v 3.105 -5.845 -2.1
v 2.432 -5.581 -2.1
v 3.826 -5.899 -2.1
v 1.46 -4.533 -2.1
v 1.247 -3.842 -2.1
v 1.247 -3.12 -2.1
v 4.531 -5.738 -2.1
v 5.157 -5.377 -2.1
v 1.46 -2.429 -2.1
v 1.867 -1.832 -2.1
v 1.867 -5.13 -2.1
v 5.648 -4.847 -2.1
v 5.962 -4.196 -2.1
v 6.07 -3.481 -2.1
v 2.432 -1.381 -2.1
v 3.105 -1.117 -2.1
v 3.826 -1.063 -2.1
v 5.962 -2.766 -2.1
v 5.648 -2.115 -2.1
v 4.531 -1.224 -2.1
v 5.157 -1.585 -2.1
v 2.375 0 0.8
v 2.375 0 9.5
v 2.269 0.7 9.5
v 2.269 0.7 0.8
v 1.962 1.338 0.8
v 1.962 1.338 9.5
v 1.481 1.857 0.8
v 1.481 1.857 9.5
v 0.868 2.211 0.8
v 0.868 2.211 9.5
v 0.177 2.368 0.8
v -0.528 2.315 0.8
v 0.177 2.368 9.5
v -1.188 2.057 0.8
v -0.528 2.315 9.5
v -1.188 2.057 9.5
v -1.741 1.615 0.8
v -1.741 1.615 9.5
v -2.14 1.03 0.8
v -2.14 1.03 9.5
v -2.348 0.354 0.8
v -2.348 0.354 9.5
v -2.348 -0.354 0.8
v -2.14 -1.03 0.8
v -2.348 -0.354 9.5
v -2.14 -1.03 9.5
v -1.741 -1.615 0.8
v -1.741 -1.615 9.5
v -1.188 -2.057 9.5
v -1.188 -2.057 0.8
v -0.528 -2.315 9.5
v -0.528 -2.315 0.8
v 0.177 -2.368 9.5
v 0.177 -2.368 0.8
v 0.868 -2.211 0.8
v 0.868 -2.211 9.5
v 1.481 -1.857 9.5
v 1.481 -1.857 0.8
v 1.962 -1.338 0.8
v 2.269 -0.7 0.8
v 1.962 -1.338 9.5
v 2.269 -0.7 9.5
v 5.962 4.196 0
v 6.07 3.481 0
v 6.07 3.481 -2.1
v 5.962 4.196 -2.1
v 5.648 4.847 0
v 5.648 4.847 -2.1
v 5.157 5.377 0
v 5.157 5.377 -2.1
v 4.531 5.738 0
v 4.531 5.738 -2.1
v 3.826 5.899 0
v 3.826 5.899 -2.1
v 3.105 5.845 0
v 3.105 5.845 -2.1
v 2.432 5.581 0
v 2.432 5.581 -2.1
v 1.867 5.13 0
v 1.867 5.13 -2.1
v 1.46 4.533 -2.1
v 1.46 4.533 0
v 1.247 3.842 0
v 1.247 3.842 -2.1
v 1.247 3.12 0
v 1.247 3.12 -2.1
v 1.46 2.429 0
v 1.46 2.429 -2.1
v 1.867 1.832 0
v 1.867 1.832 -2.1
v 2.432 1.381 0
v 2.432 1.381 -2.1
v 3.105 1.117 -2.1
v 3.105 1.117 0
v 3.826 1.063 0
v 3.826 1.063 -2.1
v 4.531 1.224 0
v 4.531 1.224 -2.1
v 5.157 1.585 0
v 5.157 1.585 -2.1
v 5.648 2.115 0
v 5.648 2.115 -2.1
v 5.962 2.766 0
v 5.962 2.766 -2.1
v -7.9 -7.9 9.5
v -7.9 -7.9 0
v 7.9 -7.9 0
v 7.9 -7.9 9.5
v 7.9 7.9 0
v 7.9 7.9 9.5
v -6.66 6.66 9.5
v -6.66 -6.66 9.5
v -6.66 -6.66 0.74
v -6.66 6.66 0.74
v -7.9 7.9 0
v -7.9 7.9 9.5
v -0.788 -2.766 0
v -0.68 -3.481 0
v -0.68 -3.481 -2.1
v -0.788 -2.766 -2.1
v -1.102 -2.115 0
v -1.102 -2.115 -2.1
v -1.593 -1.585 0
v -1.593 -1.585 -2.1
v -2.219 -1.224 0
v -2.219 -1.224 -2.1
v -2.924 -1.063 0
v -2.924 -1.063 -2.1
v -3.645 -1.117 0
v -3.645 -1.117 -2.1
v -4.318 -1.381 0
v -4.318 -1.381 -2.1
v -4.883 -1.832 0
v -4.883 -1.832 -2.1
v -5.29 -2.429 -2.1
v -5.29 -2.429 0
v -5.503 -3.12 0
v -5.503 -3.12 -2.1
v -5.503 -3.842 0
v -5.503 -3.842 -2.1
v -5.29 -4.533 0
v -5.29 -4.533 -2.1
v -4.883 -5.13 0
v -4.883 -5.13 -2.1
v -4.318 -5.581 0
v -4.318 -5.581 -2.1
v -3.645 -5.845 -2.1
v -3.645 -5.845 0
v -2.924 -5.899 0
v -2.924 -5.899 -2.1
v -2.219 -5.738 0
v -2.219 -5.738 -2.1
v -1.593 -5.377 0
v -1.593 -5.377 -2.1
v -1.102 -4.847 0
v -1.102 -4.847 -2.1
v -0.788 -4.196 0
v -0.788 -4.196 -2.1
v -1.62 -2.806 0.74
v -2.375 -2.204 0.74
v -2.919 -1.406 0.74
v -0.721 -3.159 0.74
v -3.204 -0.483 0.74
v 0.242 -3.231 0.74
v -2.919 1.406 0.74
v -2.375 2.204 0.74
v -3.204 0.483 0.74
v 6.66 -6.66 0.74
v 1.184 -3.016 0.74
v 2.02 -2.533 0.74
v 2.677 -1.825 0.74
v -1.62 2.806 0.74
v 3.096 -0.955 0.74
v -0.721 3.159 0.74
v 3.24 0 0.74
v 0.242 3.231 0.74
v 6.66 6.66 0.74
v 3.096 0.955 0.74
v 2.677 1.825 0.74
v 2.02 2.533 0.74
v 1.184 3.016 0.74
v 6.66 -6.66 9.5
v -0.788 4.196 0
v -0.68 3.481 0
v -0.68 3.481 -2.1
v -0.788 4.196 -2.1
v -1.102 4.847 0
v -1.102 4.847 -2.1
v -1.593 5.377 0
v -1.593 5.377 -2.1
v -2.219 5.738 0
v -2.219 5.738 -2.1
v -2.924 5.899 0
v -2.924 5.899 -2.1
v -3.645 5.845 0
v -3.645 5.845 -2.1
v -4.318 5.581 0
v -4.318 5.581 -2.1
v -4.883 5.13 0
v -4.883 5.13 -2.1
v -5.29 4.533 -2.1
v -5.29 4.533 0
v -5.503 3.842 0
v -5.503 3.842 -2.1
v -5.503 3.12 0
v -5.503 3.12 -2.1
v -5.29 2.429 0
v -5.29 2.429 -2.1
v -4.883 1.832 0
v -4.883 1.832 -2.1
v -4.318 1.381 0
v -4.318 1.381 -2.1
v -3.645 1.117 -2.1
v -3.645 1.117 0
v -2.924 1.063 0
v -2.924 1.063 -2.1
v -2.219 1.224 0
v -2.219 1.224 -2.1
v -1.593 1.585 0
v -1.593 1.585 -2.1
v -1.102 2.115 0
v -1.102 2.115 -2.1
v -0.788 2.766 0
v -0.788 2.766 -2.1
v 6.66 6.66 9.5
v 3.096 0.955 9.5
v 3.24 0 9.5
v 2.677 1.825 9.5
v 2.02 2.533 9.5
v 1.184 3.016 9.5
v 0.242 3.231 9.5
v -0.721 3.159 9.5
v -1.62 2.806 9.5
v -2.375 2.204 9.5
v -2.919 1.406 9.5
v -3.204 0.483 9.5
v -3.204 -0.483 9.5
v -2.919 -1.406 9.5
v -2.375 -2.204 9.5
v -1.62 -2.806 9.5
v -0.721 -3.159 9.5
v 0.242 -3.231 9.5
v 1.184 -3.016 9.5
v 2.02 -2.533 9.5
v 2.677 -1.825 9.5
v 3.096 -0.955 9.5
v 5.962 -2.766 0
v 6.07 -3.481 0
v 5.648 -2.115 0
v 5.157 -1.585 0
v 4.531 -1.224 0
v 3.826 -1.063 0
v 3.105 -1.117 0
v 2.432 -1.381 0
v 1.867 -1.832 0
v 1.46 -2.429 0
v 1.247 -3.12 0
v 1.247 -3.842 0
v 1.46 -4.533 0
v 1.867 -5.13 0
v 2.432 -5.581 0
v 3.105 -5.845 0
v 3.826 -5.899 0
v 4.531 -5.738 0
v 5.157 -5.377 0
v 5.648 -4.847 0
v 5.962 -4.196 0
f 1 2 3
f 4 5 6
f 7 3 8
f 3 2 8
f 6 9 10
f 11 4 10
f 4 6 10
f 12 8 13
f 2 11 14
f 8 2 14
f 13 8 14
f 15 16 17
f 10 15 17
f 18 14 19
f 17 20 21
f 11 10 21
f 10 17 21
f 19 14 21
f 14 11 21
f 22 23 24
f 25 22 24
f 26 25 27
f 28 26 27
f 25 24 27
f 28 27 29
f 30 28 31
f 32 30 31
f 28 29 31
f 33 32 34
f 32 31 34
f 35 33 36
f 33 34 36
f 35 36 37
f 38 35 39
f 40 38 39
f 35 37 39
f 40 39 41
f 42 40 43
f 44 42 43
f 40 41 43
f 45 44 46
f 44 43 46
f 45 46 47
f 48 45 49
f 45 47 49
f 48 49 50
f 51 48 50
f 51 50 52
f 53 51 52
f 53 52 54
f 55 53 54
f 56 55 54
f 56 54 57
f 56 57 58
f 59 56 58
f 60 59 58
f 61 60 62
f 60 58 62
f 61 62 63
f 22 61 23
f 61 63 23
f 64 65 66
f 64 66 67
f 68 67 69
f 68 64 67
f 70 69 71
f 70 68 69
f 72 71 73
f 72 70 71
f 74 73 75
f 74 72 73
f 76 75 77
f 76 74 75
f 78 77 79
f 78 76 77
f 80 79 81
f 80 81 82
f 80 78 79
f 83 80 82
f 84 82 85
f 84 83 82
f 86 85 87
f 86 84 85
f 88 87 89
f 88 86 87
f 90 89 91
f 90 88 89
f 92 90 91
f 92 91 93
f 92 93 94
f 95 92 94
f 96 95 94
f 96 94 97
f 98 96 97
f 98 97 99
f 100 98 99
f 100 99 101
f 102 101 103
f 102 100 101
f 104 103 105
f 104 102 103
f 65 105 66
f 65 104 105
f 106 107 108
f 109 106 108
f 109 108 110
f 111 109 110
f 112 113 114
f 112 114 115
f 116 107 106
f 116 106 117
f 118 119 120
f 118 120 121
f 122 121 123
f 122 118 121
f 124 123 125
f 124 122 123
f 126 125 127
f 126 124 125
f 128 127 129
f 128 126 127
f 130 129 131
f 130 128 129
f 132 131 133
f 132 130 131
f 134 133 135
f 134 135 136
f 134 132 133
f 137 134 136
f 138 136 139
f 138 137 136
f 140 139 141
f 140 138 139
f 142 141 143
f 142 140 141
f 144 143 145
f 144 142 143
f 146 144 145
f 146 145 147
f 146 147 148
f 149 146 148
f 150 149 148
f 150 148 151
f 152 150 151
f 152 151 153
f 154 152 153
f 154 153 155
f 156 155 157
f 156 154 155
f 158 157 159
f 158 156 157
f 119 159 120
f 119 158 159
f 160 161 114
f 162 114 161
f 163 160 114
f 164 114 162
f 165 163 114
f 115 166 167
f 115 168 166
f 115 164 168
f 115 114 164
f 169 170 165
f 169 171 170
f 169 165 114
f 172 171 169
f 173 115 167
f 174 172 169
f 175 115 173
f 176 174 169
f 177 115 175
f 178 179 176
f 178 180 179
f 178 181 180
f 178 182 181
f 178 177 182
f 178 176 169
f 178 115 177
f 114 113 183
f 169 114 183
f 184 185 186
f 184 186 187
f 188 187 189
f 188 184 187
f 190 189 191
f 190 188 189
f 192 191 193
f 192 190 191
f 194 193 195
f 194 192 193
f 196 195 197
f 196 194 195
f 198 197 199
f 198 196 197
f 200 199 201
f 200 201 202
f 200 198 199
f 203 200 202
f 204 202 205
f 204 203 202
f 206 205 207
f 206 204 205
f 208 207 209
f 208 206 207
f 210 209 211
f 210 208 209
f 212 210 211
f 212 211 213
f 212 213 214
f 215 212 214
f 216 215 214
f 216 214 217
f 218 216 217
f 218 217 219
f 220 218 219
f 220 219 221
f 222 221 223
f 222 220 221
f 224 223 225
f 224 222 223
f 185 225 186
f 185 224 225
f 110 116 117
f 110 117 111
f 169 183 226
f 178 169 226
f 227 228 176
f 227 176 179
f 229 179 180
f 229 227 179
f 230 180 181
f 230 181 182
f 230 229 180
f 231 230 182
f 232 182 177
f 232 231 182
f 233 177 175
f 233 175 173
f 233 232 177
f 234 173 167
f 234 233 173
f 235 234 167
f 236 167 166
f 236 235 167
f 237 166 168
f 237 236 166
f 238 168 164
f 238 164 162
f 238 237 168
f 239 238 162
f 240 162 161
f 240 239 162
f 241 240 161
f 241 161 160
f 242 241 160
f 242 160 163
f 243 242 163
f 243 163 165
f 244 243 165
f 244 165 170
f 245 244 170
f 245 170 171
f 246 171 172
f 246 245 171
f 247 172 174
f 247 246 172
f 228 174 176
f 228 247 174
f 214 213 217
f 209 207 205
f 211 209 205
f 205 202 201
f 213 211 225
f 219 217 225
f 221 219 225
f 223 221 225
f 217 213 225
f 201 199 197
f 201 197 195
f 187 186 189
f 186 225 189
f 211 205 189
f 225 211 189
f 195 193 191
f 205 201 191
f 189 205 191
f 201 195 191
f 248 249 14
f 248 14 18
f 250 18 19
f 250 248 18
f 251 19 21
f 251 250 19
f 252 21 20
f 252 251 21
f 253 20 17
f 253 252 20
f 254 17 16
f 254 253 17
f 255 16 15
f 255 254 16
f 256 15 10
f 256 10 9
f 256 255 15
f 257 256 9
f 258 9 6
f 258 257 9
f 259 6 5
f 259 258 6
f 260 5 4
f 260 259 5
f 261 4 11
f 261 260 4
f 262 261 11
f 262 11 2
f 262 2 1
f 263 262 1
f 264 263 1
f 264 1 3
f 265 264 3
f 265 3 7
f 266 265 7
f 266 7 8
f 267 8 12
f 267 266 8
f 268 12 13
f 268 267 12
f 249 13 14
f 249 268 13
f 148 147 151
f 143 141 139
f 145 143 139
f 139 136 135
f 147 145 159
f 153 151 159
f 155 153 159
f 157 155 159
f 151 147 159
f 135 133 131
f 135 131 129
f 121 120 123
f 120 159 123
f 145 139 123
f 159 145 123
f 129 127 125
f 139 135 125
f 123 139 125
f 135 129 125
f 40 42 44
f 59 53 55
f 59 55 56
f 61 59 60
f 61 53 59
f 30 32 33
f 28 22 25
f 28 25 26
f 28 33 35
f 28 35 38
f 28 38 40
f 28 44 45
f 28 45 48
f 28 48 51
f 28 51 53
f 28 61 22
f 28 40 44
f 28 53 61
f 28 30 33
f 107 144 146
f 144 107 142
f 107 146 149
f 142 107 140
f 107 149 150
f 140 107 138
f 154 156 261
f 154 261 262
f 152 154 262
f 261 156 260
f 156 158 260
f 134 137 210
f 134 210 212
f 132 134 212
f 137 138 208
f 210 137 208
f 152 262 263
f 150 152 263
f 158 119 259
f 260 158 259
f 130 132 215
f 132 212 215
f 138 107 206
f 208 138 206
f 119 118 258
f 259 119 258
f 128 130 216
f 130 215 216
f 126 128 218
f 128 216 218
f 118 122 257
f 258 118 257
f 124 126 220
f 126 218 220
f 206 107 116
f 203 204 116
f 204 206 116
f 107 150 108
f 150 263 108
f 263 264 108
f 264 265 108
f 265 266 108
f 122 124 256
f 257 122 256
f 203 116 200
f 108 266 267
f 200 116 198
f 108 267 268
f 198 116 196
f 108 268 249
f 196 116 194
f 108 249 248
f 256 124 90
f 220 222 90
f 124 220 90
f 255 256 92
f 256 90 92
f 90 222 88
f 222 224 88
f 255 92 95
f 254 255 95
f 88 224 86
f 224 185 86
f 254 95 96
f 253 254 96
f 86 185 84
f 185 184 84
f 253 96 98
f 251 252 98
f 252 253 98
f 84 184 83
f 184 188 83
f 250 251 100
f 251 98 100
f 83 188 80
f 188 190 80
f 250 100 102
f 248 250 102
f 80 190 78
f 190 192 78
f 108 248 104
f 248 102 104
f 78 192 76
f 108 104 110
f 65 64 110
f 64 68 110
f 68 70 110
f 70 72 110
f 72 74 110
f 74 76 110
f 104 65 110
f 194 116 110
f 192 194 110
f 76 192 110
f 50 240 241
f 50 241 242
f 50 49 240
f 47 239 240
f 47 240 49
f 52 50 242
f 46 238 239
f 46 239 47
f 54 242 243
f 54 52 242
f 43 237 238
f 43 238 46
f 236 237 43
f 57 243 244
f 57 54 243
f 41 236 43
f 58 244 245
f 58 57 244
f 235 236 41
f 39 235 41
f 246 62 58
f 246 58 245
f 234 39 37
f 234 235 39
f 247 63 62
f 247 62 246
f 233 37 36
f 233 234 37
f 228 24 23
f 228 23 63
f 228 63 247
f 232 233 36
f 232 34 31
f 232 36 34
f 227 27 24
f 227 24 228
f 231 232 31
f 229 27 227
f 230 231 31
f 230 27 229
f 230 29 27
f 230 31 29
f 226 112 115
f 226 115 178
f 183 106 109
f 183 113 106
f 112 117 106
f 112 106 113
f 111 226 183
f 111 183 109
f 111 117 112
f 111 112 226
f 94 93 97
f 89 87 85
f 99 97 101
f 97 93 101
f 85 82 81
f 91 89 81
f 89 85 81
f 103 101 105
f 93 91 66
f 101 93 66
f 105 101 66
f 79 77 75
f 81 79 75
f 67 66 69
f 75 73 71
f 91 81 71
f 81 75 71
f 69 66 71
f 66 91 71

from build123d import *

# Parameters (mm, degrees)
F0_W     = 15.8
F0_H     = 15.8
F0_R     = 2.425
F1_DEPTH = 9.5
F2_DEPTH = 2.1
F3_W     = 13.32
F3_H     = 13.32
F3_R     = 3.24
F4_DEPTH = 8.76
F5_R     = 2.375
F6_DEPTH = 8.7


# Not quite as in the source:
# - a feature names something its author has since deleted; it is built from what else it names


with BuildPart() as f1:
    # F0 (on Top) → F1 (new body)
    with BuildSketch(Plane.XY):
        Rectangle(F0_W, F0_H)
        with Locations((-3.1053028645, -3.481)):
            Circle(F0_R, mode=Mode.SUBTRACT)
        with Locations((3.6446971353, -3.4810496163)):
            Circle(F0_R, mode=Mode.SUBTRACT)
        with Locations((-3.1053028647, 3.481)):
            Circle(F0_R, mode=Mode.SUBTRACT)
        with Locations((3.6446971353, 3.481)):
            Circle(F0_R, mode=Mode.SUBTRACT)
        with Locations((3.6446971353, -3.4810496163)):
            Circle(F0_R)
        with Locations((-3.1053028645, -3.481)):
            Circle(F0_R)
        with Locations((-3.1053028647, 3.481)):
            Circle(F0_R)
        with Locations((3.6446971353, 3.481)):
            Circle(F0_R)
    extrude(amount=F1_DEPTH)

    # F0 (on Top) → F2 (join)
    with BuildSketch(Plane.XY):
        with Locations((3.6446971353, 3.481)):
            Circle(F0_R)
        with Locations((-3.1053028647, 3.481)):
            Circle(F0_R)
        with Locations((-3.1053028645, -3.481)):
            Circle(F0_R)
        with Locations((3.6446971353, -3.4810496163)):
            Circle(F0_R)
    extrude(amount=-F2_DEPTH)

    # F3 (on face) → F4 (cut)
    with BuildSketch(Plane.XY.offset(9.5)):
        Rectangle(F3_W, F3_H)
        Circle(F3_R, mode=Mode.SUBTRACT)
    extrude(amount=-F4_DEPTH, mode=Mode.SUBTRACT)

    # F5 (on face) → F6 (cut)
    with BuildSketch(Plane.XY.offset(9.5)):
        Circle(F5_R)
    extrude(amount=-F6_DEPTH, mode=Mode.SUBTRACT)


solid = f1.part
